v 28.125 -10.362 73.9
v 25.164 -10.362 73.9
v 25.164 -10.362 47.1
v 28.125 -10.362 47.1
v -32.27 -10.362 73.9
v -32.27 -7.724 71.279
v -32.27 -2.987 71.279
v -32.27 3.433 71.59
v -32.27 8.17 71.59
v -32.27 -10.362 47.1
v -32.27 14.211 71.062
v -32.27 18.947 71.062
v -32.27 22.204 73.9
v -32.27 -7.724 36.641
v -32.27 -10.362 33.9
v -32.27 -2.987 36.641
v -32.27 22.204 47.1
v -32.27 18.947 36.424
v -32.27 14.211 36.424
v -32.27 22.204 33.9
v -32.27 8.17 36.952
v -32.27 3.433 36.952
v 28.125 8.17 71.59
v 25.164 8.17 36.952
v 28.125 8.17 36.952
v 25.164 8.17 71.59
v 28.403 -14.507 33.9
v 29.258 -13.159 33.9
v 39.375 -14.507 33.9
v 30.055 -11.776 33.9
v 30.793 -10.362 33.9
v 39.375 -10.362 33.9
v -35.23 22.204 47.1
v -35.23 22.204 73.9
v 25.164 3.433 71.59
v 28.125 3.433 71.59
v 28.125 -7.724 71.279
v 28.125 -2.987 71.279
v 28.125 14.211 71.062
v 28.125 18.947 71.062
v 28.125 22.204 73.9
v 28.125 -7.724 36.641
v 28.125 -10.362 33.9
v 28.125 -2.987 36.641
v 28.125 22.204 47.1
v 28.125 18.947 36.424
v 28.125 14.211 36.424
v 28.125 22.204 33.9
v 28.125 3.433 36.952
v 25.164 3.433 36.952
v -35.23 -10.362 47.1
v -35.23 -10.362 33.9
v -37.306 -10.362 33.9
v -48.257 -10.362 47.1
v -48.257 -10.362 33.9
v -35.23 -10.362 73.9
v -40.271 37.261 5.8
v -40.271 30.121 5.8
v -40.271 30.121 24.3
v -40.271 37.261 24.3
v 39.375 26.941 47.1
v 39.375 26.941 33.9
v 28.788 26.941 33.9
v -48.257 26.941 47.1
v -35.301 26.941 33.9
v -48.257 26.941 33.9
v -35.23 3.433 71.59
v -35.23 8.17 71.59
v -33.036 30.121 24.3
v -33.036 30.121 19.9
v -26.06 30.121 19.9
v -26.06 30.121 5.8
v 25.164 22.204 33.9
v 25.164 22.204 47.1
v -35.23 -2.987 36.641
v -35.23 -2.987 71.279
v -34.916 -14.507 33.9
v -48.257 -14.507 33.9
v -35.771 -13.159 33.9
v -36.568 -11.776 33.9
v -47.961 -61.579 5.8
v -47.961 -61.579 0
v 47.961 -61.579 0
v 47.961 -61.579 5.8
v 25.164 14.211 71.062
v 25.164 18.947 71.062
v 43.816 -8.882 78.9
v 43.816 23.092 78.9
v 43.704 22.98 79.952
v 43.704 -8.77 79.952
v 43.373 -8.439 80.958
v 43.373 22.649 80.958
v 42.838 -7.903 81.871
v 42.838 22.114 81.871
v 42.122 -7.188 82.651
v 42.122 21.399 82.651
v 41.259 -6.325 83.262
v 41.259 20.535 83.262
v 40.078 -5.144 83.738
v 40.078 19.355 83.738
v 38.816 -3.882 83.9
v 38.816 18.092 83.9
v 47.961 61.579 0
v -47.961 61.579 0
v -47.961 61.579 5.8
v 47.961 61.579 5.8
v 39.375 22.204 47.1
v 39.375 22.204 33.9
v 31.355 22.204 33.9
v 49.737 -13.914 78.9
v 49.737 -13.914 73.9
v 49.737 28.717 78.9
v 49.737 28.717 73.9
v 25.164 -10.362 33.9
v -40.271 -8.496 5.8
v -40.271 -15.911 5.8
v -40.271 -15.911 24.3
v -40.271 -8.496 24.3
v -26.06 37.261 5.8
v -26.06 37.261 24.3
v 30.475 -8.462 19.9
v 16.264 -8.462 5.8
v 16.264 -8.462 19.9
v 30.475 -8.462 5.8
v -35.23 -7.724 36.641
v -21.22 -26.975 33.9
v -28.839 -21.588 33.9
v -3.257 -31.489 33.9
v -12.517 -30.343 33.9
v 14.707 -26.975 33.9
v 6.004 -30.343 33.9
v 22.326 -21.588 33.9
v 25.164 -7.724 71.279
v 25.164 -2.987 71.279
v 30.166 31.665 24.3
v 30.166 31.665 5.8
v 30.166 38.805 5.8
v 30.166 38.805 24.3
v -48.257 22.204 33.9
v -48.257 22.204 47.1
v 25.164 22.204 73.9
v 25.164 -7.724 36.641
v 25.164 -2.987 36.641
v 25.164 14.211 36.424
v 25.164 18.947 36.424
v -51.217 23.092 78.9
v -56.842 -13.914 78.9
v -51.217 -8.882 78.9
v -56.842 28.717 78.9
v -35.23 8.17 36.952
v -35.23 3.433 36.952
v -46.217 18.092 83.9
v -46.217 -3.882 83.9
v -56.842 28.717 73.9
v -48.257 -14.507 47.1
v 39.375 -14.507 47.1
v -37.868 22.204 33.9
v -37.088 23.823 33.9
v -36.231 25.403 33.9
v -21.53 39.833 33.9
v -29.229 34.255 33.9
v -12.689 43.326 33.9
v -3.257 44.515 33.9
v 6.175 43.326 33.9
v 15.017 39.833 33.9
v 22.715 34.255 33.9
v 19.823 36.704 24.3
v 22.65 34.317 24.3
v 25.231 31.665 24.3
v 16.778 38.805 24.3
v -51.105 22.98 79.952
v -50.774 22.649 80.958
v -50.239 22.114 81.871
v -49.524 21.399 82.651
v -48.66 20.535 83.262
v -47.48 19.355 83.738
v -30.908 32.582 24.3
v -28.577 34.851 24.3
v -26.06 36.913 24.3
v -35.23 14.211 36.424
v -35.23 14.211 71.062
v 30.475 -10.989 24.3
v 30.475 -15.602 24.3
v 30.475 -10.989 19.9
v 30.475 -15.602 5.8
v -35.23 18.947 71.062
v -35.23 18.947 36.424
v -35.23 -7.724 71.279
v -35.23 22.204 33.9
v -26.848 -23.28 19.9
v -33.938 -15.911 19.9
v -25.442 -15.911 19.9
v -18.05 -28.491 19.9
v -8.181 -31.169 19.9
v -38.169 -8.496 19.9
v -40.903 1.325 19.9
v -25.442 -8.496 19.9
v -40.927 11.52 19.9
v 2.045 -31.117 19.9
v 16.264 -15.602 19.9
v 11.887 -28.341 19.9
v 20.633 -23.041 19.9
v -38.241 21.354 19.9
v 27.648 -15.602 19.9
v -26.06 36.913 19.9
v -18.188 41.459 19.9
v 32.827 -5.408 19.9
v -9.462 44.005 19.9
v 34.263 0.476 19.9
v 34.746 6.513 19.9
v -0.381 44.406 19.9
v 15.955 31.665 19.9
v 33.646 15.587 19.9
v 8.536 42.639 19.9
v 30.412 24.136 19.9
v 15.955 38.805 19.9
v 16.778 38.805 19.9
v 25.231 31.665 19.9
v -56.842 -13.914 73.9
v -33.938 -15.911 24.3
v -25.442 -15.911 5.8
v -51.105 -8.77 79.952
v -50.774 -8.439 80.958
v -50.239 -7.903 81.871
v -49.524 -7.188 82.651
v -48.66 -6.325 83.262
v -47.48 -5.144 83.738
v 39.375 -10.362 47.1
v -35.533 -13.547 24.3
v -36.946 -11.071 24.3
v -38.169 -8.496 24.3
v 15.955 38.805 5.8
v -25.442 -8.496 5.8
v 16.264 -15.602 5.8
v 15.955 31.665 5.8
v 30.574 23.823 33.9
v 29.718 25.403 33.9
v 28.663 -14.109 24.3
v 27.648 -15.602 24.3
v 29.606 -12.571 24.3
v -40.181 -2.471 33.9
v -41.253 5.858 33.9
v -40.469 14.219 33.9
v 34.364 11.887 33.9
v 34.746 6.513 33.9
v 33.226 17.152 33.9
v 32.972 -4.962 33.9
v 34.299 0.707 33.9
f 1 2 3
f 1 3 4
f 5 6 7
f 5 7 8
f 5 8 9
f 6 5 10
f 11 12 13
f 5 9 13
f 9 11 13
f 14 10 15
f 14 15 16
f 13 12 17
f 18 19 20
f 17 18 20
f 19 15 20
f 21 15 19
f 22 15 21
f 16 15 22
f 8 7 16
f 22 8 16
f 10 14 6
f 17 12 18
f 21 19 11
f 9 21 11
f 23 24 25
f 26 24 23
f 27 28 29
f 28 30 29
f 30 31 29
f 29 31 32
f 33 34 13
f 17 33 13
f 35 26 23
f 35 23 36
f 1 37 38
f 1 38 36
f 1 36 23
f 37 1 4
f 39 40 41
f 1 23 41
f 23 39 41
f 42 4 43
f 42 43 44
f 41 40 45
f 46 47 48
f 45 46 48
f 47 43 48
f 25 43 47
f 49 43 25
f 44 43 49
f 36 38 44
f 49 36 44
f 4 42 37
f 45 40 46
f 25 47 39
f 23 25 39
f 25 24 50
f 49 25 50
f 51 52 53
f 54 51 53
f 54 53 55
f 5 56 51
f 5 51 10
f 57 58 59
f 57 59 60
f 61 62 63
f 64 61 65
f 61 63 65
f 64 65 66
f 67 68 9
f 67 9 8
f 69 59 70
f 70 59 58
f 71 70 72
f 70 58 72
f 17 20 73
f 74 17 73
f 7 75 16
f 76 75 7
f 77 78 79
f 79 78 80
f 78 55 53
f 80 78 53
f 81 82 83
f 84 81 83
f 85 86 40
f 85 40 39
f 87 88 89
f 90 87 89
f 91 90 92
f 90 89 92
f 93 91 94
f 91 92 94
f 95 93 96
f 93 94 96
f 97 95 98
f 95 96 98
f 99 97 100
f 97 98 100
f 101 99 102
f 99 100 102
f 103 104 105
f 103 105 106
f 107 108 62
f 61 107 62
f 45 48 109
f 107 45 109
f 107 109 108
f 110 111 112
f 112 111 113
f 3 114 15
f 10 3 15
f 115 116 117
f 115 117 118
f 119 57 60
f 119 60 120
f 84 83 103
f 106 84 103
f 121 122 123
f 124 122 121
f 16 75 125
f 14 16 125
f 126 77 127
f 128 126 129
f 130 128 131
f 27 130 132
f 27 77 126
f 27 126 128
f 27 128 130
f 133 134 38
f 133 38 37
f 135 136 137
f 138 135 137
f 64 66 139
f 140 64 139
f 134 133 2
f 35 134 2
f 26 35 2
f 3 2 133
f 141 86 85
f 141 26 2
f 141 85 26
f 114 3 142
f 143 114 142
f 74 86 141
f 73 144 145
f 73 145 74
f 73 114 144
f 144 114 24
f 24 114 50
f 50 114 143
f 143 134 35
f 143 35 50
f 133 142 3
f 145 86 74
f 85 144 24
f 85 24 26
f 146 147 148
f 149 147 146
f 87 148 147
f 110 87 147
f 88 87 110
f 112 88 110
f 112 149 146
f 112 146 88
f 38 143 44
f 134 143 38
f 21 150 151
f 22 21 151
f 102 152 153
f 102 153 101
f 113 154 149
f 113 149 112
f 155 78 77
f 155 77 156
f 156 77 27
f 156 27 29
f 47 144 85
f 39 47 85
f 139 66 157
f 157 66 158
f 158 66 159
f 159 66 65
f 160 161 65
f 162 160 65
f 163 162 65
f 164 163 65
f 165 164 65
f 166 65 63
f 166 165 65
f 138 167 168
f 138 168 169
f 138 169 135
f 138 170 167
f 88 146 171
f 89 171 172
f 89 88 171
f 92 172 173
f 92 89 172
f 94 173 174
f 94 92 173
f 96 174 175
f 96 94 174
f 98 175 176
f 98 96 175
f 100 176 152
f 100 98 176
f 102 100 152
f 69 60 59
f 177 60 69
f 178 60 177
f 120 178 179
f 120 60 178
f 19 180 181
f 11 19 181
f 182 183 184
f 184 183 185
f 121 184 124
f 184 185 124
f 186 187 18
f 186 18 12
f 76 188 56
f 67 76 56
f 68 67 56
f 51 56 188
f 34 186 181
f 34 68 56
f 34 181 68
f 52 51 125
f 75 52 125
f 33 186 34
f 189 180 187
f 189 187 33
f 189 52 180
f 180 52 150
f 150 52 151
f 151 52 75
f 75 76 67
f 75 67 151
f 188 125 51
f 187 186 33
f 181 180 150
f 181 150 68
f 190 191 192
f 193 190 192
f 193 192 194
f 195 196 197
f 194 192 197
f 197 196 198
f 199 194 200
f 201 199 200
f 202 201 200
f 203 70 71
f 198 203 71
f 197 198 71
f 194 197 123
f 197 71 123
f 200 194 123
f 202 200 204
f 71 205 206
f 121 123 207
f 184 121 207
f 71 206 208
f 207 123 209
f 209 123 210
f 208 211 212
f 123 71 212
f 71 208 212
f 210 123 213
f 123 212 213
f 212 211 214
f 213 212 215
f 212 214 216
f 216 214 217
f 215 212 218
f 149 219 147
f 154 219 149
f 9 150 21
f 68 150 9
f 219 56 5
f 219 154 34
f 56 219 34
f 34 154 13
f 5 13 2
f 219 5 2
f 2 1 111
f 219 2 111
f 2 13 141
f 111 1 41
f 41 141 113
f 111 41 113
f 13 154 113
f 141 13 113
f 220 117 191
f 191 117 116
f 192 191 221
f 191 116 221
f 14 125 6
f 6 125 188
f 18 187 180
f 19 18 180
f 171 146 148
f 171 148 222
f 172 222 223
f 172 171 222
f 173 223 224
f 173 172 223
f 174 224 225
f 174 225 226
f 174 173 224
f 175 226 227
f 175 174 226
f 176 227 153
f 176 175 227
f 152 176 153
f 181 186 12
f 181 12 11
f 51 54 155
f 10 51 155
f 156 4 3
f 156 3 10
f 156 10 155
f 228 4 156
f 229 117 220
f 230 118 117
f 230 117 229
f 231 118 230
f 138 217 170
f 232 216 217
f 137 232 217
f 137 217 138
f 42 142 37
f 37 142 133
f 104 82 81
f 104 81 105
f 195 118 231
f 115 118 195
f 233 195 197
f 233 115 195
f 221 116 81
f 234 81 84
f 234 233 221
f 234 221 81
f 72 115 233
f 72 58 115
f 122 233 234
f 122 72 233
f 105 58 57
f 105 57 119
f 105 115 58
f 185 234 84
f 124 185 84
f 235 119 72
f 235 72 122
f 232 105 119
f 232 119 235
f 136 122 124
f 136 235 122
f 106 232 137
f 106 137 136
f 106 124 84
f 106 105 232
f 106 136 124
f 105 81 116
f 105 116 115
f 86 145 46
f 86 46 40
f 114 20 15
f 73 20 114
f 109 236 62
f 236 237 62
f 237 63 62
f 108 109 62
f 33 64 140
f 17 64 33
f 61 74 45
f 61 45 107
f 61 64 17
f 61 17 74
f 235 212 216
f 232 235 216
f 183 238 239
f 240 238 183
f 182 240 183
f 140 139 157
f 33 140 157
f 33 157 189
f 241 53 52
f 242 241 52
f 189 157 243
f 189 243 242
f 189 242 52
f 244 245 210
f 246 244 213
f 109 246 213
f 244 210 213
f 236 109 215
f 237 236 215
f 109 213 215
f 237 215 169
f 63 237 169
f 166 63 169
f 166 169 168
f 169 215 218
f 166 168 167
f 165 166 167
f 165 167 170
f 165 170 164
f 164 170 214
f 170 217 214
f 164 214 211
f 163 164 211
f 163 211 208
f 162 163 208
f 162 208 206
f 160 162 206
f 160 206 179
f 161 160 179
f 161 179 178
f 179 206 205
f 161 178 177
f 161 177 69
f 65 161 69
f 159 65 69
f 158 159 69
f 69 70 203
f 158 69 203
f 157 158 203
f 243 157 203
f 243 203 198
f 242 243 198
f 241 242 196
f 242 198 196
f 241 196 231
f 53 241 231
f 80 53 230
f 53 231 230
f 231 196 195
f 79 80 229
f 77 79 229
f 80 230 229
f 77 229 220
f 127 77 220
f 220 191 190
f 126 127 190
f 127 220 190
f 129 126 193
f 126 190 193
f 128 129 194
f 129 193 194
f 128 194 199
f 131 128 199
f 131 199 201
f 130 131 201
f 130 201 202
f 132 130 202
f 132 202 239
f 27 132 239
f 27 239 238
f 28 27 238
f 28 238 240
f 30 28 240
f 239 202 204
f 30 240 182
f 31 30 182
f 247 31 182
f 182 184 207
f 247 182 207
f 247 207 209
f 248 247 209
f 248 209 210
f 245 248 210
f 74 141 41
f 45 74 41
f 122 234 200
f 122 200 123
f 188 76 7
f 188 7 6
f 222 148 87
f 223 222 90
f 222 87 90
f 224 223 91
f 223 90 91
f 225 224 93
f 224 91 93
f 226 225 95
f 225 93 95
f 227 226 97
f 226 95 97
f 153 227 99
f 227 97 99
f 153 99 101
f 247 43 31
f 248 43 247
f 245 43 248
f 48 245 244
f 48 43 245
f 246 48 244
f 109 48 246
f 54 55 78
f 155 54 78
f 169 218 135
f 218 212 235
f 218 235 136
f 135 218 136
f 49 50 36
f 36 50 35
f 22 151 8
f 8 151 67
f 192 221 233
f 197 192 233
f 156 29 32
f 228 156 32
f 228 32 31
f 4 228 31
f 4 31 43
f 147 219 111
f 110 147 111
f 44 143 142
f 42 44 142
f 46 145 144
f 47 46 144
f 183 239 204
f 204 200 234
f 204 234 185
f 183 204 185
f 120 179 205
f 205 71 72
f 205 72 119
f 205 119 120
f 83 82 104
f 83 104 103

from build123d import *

# Parameters (mm, degrees)
F0_W      = 95.9210544825
F0_H      = 123.1578961015
F1_DEPTH  = 5.8
F2_W      = 14.211
F2_H      = 7.14
F2_W_2    = 14.82887734
F2_H_2    = 7.4144396418
F3_DEPTH  = 18.5
F5_R      = 38.0021383108
F6_DEPTH  = 14
F8_DEPTH  = 13.2
F9_W      = 2.9605254531
F9_H      = 32.5657902285
F10_DEPTH = 40
F12_W     = 106.5789507702
F12_H     = 42.6315842196
F13_DEPTH = 5
F15_W     = 95.0329005718
F15_H     = 31.9736870006
F16_DEPTH = 5
F17_R     = 4.99999
F18_W     = 4.7368425876
F18_H     = 34.638158977
F19_DEPTH = 69.8
F20_W     = 4.737
F20_H     = 34.638
F21_DEPTH = 93.3
F22_W     = 4.737
F22_H     = 34.638
F23_DEPTH = 98.3


# Not quite as in the source:
# - a fillet or chamfer is up to 0.001 mm smaller than in the source, because OpenCascade refuses the exact size


with BuildPart() as f1:
    # F0 (on Top) → F1 (new body)
    with BuildSketch(Plane.XY):
        Rectangle(F0_W, F0_H)
    extrude(amount=F1_DEPTH)

    # F2 (on face) → F3 (join)
    with BuildSketch(Plane.XY.offset(5.8)):
        with Locations((-33.1652933639, 33.6907944659)):
            Rectangle(F2_W, F2_H)
        with Locations((23.060855536, 35.2354664353)):
            Rectangle(F2_W, F2_H)
        with Locations((23.3697903186, -12.0315703675)):
            Rectangle(F2_W, F2_H)
        with Locations((-32.8563585813, -12.2032872729)):
            Rectangle(F2_W_2, F2_H_2)
    extrude(amount=F3_DEPTH)

    # F5 (on offset) → F6 (join)
    with BuildSketch(Plane.XY.offset(19.9)):
        with Locations((-3.2565793954, 6.5131578594)):
            Circle(F5_R)
    extrude(amount=F6_DEPTH)

    # F7 (on face) → F8 (join)
    with BuildSketch(Plane.XY.offset(33.9)):
        with BuildLine():
            Line((30.7933383724, -10.3618418798), (-37.3064971632, -10.3618418798))
            ThreePointArc((-37.3064971632, -10.3618418798), (-36.1766552365, -12.4718657857), (-34.9162250459, -14.5065793768))
            Line((-34.9162250459, -14.5065793768), (28.4030662551, -14.5065793768))
            ThreePointArc((28.4030662551, -14.5065793768), (29.6634964457, -12.4718657857), (30.7933383724, -10.3618418798))
        make_face()
        with BuildLine():
            Line((39.3750034273, -10.3618418798), (30.7933383724, -10.3618418798))
            ThreePointArc((30.7933383724, -10.3618418798), (29.6634964457, -12.4718657857), (28.4030662551, -14.5065793768))
            Line((28.4030662551, -14.5065793768), (39.3750034273, -14.5065793768))
            Line((39.3750034273, -14.5065793768), (39.3750034273, -10.3618418798))
        make_face()
        with BuildLine():
            ThreePointArc((-34.9162250459, -14.5065793768), (-36.1766552365, -12.4718657857), (-37.3064971632, -10.3618418798))
            Line((-37.3064971632, -10.3618418798), (-48.2565825805, -10.3618418798))
            Line((-48.2565825805, -10.3618418798), (-48.2565825805, -14.5065793768))
            Line((-48.2565825805, -14.5065793768), (-34.9162250459, -14.5065793768))
        make_face()
        with BuildLine():
            Line((-37.8681614166, 22.2039483488), (31.3550026259, 22.2039483488))
            ThreePointArc((31.3550026259, 22.2039483488), (30.1557002498, 24.6179109675), (28.7883016181, 26.9407890737))
            Line((28.7883016181, 26.9407890737), (-35.3014604088, 26.9407890737))
            ThreePointArc((-35.3014604088, 26.9407890737), (-36.6688590406, 24.6179109675), (-37.8681614166, 22.2039483488))
        make_face()
        with BuildLine():
            Line((-48.2565825805, 22.2039483488), (-37.8681614166, 22.2039483488))
            ThreePointArc((-37.8681614166, 22.2039483488), (-36.6688590406, 24.6179109675), (-35.3014604088, 26.9407890737))
            Line((-35.3014604088, 26.9407890737), (-48.2565825805, 26.9407890737))
            Line((-48.2565825805, 26.9407890737), (-48.2565825805, 22.2039483488))
        make_face()
        with BuildLine():
            Line((31.3550026259, 22.2039483488), (39.3750034273, 22.2039483488))
            Line((39.3750034273, 22.2039483488), (39.3750034273, 26.9407890737))
            Line((39.3750034273, 26.9407890737), (28.7883016181, 26.9407890737))
            ThreePointArc((28.7883016181, 26.9407890737), (30.1557002498, 24.6179109675), (31.3550026259, 22.2039483488))
        make_face()
    extrude(amount=F8_DEPTH)

    # F9 (on face) → F10 (join)
    with BuildSketch(Plane.XY.offset(33.9)):
        with Locations((-33.7500013411, 5.9210532345)):
            Rectangle(F9_W, F9_H)
        with Locations((26.6447365284, 5.9210532345)):
            Rectangle(F9_W, F9_H)
    extrude(amount=F10_DEPTH)

    # F12 (on offset) → F13 (join)
    with BuildSketch(Plane.XY.offset(73.9)):
        with Locations((-3.5526319407, 7.401315961)):
            Rectangle(F12_W, F12_H)
    extrude(amount=F13_DEPTH)

    # F15 (on face) → F16 (join)
    with BuildSketch(Plane.XY.offset(78.9)):
        with Locations((-3.700658679, 7.105264347)):
            Rectangle(F15_W, F15_H)
    extrude(amount=F16_DEPTH)

    # F17 (radius 5 in the source; OpenCascade refuses exactly that, so slightly less here)
    f17_edges = [f1.edges().sort_by_distance(p)[0] for p in [
        (-3.700659, 23.092108, 83.9),
        (-51.217109, 7.105264, 83.9),
        (-3.700659, -8.881579, 83.9),
        (43.815792, 7.105264, 83.9),
    ]]
    fillet(f17_edges, radius=F17_R)

    # F18 (on face) → F19 (cut)
    with BuildSketch(Plane(origin=(-35.2302640676, 0, 0), x_dir=(0, -1, 0), z_dir=(-1, 0, 0))):
        with Locations((-16.5789490566, 53.742762655)):
            Rectangle(F18_W, F18_H)
    extrude(amount=-F19_DEPTH, mode=Mode.SUBTRACT)

    # F20 (on face) → F21 (cut)
    with BuildSketch(Plane(origin=(-35.2302640676, 0, 0), x_dir=(0, -1, 0), z_dir=(-1, 0, 0))):
        with Locations((-5.8019411517, 54.2707815458)):
            Rectangle(F20_W, F20_H)
    extrude(amount=-F21_DEPTH, mode=Mode.SUBTRACT)

    # F22 (on face) → F23 (cut)
    with BuildSketch(Plane(origin=(-35.2302640676, 0, 0), x_dir=(0, -1, 0), z_dir=(-1, 0, 0))):
        with Locations((5.355990259, 53.9595156418)):
            Rectangle(F22_W, F22_H)
    extrude(amount=-F23_DEPTH, mode=Mode.SUBTRACT)


solid = f1.part
